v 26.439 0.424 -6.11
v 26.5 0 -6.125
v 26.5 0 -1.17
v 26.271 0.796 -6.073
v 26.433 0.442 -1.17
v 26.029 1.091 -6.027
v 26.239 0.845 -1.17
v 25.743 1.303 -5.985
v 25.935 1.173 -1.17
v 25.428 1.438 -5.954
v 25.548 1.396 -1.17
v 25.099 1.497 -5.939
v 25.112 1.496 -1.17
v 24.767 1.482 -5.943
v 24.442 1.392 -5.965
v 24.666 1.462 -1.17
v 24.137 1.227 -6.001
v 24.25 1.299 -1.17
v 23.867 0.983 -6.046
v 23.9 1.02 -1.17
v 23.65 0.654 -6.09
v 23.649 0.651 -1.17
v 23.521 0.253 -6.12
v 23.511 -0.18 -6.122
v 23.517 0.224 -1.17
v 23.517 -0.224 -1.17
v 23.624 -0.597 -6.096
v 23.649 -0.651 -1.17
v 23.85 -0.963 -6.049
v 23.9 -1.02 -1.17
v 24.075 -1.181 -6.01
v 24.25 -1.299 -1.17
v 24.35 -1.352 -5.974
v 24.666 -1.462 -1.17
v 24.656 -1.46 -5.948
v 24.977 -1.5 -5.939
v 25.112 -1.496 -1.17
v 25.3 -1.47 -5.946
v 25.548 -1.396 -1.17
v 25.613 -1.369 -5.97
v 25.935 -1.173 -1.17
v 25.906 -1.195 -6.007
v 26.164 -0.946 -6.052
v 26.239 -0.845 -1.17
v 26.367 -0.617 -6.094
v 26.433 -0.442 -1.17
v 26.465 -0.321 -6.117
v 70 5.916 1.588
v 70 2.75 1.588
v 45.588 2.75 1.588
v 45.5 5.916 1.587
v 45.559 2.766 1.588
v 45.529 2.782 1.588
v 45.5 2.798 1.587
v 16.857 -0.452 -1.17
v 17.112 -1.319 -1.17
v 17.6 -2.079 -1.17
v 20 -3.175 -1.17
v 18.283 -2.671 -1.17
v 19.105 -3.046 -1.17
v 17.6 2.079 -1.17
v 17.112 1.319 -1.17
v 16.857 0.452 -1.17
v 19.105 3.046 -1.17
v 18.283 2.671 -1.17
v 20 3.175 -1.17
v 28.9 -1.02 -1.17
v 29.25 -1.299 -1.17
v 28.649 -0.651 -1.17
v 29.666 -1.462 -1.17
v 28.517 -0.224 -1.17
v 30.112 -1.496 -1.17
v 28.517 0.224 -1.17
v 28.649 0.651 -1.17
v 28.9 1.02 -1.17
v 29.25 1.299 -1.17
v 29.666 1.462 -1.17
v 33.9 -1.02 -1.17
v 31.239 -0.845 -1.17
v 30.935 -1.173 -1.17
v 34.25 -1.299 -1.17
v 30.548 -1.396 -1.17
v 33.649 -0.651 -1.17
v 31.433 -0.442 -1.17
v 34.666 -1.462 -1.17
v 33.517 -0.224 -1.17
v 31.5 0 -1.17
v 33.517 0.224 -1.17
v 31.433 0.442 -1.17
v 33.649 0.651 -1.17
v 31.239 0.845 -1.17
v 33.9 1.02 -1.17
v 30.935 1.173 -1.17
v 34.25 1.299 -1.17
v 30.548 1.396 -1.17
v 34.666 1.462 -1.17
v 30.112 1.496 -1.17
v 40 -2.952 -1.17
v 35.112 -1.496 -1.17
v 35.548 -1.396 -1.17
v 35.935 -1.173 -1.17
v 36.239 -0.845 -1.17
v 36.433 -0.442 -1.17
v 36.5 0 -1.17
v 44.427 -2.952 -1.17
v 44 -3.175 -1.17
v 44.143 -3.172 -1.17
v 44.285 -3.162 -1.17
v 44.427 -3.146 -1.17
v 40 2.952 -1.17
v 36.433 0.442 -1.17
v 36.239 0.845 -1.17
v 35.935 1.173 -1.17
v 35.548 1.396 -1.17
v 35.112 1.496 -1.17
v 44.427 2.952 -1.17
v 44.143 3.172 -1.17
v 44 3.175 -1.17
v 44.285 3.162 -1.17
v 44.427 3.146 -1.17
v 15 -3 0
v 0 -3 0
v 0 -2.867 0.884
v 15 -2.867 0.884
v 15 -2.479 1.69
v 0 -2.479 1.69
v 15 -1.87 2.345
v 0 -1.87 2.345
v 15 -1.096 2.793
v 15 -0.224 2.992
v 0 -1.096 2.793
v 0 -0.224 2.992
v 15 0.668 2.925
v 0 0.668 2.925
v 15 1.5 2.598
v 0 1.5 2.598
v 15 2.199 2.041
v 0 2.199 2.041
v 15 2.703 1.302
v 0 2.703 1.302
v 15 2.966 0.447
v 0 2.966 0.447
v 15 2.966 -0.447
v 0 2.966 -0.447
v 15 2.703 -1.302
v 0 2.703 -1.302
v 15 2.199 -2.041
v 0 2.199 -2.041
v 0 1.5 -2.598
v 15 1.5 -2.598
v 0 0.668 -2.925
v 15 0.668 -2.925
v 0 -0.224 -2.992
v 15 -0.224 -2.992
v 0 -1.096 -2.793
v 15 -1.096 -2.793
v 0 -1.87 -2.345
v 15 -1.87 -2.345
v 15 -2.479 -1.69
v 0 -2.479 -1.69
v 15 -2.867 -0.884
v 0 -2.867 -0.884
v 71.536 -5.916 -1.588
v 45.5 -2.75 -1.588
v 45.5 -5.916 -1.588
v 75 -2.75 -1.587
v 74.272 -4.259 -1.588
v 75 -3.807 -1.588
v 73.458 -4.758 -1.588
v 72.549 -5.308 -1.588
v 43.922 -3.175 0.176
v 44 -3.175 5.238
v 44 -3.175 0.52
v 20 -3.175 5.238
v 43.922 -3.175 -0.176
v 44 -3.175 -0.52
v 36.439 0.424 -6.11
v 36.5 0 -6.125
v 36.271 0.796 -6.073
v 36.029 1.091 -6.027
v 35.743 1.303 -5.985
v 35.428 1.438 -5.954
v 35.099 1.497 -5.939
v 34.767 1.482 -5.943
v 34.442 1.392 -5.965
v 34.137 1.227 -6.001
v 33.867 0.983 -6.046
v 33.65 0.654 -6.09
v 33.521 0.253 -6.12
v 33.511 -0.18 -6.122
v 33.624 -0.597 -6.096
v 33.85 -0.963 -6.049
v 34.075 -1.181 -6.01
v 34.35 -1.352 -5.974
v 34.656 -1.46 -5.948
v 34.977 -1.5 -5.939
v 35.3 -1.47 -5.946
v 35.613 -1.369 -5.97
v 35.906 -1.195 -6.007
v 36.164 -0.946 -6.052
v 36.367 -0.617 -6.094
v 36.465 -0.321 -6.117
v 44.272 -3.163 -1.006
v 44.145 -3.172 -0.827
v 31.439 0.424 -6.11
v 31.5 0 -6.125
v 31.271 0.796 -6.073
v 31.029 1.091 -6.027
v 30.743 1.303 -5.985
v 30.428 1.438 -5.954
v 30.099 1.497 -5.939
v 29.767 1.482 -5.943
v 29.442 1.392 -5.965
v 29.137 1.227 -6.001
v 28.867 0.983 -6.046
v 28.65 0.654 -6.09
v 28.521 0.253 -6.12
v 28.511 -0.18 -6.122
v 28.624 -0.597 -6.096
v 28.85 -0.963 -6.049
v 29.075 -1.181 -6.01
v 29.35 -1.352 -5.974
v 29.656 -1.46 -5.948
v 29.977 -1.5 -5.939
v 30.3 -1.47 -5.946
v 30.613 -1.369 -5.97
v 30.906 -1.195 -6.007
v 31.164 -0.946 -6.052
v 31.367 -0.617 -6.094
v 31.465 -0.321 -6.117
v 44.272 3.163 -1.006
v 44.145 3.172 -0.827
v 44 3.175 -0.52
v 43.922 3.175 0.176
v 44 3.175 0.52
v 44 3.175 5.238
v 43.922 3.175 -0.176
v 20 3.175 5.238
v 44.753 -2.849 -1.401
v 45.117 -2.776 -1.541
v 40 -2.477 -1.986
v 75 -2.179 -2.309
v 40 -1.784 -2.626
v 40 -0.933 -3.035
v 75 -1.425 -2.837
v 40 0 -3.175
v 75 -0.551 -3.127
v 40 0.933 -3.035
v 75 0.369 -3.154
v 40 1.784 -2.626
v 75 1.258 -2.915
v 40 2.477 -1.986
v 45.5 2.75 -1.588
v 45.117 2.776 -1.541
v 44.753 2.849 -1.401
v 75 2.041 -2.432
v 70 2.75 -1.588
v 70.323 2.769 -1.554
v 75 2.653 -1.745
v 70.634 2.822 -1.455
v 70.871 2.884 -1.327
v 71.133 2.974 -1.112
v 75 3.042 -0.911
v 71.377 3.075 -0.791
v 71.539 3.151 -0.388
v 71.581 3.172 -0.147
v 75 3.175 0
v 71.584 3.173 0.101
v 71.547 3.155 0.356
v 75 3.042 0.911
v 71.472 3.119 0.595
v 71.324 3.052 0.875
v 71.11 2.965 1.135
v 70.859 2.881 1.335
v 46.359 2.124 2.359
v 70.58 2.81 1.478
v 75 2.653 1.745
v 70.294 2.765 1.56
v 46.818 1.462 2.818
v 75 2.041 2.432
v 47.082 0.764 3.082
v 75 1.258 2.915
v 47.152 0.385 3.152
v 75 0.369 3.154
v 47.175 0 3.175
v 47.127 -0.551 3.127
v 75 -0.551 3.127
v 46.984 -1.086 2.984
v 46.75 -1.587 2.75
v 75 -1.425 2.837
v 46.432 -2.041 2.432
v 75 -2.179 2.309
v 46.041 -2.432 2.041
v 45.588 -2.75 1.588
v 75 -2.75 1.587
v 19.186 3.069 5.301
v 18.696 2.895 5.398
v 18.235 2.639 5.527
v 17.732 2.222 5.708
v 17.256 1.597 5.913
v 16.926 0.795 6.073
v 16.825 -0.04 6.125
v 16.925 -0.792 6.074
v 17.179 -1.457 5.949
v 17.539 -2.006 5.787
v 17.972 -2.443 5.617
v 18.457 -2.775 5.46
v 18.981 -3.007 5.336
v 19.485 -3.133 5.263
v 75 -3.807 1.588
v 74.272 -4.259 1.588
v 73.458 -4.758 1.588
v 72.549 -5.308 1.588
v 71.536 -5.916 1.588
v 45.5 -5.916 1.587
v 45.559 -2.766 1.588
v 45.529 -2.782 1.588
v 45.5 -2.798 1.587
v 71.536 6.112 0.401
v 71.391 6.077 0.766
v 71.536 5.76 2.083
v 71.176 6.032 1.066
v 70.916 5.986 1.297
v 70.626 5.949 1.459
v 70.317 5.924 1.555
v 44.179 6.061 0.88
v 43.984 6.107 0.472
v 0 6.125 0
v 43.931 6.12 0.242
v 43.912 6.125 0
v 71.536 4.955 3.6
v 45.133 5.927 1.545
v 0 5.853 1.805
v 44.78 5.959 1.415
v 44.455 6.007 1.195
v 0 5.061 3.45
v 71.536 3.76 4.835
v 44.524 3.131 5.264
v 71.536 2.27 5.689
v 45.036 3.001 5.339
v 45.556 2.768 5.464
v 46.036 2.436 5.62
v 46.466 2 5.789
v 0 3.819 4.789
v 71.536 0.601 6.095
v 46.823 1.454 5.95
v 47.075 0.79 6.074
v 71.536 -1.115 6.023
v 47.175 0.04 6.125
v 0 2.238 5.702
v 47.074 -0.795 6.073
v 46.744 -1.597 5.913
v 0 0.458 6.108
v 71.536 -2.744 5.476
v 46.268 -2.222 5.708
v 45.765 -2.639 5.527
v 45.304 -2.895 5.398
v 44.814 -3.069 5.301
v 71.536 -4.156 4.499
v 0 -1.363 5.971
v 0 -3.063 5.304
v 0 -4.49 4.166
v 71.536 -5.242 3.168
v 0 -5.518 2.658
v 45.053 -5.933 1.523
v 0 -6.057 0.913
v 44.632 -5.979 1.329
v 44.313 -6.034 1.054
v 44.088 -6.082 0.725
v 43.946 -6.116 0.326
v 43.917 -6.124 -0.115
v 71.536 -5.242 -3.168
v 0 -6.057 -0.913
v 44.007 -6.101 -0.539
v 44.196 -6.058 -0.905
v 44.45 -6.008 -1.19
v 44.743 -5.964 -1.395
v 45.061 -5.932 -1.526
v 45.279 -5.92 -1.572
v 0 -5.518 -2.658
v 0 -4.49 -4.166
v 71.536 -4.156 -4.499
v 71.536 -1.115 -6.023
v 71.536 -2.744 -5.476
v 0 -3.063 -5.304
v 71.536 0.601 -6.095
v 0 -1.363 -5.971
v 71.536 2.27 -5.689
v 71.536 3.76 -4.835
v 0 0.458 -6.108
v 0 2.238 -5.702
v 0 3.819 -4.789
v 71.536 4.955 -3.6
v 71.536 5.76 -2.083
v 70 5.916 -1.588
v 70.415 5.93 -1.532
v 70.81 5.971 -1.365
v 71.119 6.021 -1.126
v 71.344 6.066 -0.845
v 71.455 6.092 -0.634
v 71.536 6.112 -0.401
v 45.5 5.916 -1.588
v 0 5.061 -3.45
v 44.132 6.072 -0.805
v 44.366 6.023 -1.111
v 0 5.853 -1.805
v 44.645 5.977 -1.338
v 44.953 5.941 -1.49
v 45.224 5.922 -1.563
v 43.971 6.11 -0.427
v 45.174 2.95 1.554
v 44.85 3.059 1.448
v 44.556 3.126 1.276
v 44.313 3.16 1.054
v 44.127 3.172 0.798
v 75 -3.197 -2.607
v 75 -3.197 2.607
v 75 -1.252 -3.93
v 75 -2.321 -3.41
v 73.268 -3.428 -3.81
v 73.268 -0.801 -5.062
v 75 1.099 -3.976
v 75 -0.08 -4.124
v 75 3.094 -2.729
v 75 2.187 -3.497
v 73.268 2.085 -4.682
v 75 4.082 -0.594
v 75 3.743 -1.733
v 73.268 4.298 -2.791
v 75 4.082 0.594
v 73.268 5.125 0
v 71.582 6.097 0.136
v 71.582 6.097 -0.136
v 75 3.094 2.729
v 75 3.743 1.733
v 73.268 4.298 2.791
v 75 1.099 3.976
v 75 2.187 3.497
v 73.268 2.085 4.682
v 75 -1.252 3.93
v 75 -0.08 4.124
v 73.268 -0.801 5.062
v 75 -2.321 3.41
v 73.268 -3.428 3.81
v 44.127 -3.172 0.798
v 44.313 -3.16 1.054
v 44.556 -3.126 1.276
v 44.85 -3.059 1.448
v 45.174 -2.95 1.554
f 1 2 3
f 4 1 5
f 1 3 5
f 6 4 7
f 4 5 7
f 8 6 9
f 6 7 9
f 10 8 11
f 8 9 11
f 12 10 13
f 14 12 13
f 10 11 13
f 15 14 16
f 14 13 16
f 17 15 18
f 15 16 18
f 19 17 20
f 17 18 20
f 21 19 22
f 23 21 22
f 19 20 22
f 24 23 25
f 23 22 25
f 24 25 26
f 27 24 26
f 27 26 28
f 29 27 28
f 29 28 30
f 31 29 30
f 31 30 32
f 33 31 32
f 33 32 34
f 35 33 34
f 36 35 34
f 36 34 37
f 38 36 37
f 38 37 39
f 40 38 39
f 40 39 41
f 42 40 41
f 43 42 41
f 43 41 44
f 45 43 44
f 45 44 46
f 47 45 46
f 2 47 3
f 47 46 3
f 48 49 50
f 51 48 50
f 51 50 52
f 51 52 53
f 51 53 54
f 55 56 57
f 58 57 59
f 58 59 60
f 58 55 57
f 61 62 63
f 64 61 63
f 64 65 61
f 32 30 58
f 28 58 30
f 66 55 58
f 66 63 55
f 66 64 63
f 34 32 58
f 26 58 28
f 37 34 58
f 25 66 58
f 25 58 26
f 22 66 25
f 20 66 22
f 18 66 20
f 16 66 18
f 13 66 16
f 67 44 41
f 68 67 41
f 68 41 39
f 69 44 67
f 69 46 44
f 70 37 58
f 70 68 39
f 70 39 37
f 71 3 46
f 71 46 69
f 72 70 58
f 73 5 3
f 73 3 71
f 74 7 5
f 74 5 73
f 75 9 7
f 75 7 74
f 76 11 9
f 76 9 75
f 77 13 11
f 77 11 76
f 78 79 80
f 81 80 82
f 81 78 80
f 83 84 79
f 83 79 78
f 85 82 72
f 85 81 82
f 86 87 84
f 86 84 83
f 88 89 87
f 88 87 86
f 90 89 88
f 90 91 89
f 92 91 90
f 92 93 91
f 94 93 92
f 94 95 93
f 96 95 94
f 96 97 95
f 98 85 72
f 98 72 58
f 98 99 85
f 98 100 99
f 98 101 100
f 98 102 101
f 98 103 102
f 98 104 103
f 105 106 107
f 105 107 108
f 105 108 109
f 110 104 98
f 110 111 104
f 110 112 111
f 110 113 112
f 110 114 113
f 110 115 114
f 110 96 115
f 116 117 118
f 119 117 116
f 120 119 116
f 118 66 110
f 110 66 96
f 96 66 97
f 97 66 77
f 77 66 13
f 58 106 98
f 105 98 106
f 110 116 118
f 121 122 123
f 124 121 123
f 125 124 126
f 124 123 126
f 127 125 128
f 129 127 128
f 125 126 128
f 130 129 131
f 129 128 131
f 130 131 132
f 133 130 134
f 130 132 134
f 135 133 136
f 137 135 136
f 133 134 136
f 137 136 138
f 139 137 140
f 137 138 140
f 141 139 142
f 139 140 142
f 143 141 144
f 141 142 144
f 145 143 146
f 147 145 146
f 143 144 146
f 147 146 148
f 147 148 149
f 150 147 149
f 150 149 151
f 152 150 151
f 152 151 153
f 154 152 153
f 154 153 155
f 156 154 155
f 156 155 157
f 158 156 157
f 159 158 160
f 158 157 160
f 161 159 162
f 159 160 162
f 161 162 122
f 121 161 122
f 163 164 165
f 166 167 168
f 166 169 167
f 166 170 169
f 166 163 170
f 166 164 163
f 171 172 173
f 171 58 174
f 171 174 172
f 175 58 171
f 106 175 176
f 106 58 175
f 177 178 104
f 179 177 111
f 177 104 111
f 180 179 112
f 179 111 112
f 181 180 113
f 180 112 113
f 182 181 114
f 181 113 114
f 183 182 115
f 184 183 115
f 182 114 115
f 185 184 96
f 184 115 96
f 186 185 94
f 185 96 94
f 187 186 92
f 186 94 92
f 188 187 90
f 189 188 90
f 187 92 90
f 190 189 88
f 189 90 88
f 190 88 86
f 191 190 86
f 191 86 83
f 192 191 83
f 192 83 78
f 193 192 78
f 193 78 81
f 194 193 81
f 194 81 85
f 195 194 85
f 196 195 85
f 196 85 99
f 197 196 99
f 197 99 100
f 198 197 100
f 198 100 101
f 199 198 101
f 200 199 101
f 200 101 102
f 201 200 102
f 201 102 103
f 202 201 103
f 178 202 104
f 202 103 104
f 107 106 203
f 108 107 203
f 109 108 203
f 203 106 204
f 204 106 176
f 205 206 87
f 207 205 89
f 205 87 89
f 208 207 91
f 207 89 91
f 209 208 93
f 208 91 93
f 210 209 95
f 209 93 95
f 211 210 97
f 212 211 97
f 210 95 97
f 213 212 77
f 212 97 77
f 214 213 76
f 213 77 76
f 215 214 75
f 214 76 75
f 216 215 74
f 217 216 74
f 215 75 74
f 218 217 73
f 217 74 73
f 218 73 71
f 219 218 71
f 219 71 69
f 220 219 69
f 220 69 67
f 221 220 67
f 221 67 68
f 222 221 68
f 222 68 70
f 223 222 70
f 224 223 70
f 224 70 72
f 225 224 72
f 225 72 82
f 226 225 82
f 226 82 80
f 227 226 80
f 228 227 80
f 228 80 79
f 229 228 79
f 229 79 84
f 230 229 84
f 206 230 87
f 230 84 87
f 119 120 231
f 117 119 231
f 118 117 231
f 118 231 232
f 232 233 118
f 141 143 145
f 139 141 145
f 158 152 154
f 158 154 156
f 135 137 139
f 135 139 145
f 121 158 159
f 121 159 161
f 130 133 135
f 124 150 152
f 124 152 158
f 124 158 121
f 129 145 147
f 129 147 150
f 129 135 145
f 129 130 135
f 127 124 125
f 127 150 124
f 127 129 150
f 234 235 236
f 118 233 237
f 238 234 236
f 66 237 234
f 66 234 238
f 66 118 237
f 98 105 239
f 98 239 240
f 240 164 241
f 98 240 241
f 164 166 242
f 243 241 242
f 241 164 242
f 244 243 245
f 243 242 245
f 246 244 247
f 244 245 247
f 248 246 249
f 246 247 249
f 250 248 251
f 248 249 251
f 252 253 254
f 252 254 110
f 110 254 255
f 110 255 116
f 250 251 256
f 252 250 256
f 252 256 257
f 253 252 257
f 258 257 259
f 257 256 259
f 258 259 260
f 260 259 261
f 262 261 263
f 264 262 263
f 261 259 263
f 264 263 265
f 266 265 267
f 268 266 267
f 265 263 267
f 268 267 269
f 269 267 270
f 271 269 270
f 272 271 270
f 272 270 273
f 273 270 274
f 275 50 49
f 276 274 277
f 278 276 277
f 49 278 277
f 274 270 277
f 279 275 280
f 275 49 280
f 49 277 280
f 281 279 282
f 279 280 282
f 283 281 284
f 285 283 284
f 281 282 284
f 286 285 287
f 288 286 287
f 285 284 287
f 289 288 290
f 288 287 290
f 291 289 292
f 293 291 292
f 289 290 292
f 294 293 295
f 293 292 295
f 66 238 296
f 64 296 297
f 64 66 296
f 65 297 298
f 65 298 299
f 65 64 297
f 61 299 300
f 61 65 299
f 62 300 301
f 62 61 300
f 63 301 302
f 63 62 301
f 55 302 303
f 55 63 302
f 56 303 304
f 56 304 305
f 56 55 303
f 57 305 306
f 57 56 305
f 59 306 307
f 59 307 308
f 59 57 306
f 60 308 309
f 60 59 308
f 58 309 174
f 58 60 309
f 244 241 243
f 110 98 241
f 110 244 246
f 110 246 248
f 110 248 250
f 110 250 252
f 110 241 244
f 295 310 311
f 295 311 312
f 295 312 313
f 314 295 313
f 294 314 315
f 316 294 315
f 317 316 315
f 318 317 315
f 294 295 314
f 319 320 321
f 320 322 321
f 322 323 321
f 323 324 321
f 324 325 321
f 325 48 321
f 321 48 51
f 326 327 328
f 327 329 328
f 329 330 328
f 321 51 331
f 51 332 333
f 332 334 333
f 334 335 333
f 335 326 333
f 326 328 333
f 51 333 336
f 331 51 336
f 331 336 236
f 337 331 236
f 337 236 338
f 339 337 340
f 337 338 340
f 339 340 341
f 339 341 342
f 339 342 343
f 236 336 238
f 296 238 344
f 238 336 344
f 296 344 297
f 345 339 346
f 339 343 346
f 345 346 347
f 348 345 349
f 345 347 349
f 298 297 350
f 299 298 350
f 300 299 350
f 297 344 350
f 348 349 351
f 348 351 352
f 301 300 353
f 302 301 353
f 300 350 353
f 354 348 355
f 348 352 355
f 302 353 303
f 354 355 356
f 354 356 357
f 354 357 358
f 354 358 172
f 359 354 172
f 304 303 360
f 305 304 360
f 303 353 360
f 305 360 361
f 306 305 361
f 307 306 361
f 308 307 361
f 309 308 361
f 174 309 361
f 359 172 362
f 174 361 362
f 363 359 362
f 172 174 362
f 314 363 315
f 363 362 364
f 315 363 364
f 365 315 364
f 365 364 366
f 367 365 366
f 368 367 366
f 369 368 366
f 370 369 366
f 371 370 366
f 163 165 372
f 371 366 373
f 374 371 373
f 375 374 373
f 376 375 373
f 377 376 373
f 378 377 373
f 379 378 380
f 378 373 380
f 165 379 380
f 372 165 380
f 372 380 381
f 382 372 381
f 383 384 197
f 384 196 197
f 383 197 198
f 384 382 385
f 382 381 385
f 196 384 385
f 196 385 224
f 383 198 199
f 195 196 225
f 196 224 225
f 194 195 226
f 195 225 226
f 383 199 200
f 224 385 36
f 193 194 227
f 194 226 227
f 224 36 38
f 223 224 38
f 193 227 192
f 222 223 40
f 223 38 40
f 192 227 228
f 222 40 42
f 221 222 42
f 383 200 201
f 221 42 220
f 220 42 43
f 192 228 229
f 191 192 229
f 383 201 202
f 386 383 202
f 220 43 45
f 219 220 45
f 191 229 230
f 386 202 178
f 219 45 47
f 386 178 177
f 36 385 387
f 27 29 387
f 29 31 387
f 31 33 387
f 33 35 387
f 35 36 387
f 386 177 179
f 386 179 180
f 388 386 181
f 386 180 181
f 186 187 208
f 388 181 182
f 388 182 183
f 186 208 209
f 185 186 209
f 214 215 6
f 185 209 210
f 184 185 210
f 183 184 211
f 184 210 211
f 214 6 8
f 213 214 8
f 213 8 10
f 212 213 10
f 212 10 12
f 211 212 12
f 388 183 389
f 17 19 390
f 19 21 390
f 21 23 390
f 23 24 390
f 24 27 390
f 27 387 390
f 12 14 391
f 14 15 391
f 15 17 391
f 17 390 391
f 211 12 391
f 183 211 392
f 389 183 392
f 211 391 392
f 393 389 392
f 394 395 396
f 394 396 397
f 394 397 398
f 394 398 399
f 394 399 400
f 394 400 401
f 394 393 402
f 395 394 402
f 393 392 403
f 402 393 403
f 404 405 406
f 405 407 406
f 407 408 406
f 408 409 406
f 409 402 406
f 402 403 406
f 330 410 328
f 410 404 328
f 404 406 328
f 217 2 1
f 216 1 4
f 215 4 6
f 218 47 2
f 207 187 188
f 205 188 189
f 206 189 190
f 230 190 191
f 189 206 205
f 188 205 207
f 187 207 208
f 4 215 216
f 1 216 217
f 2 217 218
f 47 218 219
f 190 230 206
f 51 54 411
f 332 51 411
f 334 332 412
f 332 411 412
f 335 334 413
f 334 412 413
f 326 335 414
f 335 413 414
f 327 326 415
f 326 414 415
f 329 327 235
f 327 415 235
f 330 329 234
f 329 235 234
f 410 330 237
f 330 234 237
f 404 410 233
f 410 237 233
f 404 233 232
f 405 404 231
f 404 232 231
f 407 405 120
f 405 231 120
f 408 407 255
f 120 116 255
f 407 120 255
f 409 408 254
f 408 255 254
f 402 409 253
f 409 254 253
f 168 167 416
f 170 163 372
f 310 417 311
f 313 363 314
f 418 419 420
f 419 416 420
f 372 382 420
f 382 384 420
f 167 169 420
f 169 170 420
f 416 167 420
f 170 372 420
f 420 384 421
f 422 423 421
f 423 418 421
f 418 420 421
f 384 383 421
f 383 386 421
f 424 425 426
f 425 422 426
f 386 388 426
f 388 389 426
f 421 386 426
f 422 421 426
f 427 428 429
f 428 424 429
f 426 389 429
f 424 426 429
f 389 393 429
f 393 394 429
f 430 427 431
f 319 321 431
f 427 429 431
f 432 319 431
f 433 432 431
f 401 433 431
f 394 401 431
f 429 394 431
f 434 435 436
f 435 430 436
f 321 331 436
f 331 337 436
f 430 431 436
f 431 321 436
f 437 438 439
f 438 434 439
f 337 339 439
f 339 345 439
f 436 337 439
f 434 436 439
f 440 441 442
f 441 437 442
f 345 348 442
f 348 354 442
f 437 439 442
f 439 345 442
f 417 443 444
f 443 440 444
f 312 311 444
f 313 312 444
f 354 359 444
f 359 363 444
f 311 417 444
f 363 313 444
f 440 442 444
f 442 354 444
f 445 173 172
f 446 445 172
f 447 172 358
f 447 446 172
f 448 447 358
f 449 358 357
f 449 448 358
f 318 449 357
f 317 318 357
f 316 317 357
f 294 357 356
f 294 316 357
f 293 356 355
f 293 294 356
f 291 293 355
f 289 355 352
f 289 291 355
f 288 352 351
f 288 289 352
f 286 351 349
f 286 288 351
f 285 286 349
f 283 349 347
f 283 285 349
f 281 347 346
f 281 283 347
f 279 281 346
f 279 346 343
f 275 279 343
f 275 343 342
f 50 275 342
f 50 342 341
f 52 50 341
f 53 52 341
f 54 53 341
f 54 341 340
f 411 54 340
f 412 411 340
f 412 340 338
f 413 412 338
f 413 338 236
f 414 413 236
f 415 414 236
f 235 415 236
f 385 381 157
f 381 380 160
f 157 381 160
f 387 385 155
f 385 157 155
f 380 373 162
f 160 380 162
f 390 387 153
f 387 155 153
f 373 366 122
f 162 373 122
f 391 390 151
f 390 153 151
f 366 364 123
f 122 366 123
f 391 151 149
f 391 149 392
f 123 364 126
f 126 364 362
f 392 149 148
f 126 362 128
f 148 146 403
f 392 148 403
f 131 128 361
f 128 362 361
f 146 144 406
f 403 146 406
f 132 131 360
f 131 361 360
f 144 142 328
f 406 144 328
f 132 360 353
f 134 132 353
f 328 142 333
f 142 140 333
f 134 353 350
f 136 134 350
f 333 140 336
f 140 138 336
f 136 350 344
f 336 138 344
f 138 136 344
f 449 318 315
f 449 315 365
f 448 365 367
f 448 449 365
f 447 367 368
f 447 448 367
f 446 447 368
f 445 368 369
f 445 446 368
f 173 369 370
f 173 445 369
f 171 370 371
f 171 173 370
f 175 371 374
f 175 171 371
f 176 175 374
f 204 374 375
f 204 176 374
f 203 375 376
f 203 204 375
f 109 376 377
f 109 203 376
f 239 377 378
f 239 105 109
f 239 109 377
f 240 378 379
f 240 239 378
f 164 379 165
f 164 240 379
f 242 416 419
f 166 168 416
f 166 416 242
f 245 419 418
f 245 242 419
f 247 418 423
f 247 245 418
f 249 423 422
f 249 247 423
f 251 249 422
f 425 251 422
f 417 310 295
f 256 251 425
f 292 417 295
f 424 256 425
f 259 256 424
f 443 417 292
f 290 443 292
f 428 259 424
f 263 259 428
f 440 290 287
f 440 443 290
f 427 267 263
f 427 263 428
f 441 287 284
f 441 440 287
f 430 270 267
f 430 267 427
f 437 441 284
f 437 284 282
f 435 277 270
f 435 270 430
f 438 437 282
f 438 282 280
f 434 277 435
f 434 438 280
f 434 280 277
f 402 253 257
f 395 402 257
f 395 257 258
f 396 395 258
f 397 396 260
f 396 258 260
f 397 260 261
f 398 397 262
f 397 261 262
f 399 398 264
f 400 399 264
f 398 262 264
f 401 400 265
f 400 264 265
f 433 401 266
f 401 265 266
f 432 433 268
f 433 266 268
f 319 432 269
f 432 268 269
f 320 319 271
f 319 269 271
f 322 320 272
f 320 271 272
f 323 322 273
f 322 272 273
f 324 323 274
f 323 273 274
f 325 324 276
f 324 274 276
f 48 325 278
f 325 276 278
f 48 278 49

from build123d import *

# Parameters (mm, degrees)
F0_R           = 6.125
F1_DEPTH       = 75
F2_R           = 3.175
F3_DEPTH       = 35
F4_R           = 3
F5_DEPTH       = 15
F6_SIZE2       = 3.4641016151
F6_SIZE        = 2
F8_DEPTH       = 6.126
F8_DEPTH_BACK  = 1.17
F10_DEPTH      = 6.1260001
F10_DEPTH_BACK = 6.1260001
F11_W          = 15
F11_H          = 3.175
F12_DEPTH      = 25.0000003725
F13_R          = 1.5
F14_DEPTH      = 4.9560001


with BuildPart() as f1:
    # F0 (on Right) → F1 (new body)
    with BuildSketch(Plane.YZ):
        Circle(F0_R)
    extrude(amount=F1_DEPTH)

    # F2 (on face) → F3 (cut)
    with BuildSketch(Plane.YZ.offset(75)):
        Circle(F2_R)
    extrude(amount=-F3_DEPTH, mode=Mode.SUBTRACT)

    # F4 (on face) → F5 (cut)
    with BuildSketch(Plane(origin=(0, 0, 0), x_dir=(0, -1, 0), z_dir=(-1, 0, 0))):
        Circle(F4_R)
    extrude(amount=-F5_DEPTH, mode=Mode.SUBTRACT)

    # F6
    f6_edges = [f1.edges().sort_by_distance(p)[0] for p in [
        (75, -6.125, 0),
    ]]
    f6_side = f1.faces().sort_by_distance((75, -5.951759, 0))[0]
    chamfer(f6_edges, length=F6_SIZE, length2=F6_SIZE2, reference=f6_side)

    # F7 (on Top) → F8 (cut, two sides)
    with BuildSketch(Plane.XY) as f8_sk:
        with BuildLine():
            Line((44, 3.175), (20, 3.175))
            ThreePointArc((20, 3.175), (16.825, 0), (20, -3.175))
            Line((20, -3.175), (44, -3.175))
            ThreePointArc((44, -3.175), (47.175, 0), (44, 3.175))
        make_face()
    extrude(amount=F8_DEPTH, mode=Mode.SUBTRACT)
    extrude(f8_sk.sketch, amount=-F8_DEPTH_BACK, mode=Mode.SUBTRACT)

    # F9 (on Front) → F10 (cut, two sides)
    with BuildSketch(Plane.XZ) as f10_sk:
        with BuildLine():
            Line((70, 1.5875), (45.5, 1.5875))
            ThreePointArc((45.5, 1.5875), (43.9125, 0), (45.5, -1.5875))
            Line((45.5, -1.5875), (70, -1.5875))
            ThreePointArc((70, -1.5875), (71.5875, 0), (70, 1.5875))
        make_face()
    extrude(amount=-F10_DEPTH, mode=Mode.SUBTRACT)
    extrude(f10_sk.sketch, amount=F10_DEPTH_BACK, mode=Mode.SUBTRACT)

    # F11 (on Front) → F12 (cut)
    with BuildSketch(Plane.XZ):
        with Locations((70.5, 0)):
            Rectangle(F11_W, F11_H)
    extrude(amount=F12_DEPTH, mode=Mode.SUBTRACT)

    # F13 (on face) → F14 (cut, through all)
    with BuildSketch(Plane.XY.offset(-1.17)):
        with Locations((25, 0)):
            Circle(F13_R)
        with Locations((30, 0)):
            Circle(F13_R)
        with Locations((35, 0)):
            Circle(F13_R)
    extrude(amount=-F14_DEPTH, mode=Mode.SUBTRACT)


solid = f1.part
